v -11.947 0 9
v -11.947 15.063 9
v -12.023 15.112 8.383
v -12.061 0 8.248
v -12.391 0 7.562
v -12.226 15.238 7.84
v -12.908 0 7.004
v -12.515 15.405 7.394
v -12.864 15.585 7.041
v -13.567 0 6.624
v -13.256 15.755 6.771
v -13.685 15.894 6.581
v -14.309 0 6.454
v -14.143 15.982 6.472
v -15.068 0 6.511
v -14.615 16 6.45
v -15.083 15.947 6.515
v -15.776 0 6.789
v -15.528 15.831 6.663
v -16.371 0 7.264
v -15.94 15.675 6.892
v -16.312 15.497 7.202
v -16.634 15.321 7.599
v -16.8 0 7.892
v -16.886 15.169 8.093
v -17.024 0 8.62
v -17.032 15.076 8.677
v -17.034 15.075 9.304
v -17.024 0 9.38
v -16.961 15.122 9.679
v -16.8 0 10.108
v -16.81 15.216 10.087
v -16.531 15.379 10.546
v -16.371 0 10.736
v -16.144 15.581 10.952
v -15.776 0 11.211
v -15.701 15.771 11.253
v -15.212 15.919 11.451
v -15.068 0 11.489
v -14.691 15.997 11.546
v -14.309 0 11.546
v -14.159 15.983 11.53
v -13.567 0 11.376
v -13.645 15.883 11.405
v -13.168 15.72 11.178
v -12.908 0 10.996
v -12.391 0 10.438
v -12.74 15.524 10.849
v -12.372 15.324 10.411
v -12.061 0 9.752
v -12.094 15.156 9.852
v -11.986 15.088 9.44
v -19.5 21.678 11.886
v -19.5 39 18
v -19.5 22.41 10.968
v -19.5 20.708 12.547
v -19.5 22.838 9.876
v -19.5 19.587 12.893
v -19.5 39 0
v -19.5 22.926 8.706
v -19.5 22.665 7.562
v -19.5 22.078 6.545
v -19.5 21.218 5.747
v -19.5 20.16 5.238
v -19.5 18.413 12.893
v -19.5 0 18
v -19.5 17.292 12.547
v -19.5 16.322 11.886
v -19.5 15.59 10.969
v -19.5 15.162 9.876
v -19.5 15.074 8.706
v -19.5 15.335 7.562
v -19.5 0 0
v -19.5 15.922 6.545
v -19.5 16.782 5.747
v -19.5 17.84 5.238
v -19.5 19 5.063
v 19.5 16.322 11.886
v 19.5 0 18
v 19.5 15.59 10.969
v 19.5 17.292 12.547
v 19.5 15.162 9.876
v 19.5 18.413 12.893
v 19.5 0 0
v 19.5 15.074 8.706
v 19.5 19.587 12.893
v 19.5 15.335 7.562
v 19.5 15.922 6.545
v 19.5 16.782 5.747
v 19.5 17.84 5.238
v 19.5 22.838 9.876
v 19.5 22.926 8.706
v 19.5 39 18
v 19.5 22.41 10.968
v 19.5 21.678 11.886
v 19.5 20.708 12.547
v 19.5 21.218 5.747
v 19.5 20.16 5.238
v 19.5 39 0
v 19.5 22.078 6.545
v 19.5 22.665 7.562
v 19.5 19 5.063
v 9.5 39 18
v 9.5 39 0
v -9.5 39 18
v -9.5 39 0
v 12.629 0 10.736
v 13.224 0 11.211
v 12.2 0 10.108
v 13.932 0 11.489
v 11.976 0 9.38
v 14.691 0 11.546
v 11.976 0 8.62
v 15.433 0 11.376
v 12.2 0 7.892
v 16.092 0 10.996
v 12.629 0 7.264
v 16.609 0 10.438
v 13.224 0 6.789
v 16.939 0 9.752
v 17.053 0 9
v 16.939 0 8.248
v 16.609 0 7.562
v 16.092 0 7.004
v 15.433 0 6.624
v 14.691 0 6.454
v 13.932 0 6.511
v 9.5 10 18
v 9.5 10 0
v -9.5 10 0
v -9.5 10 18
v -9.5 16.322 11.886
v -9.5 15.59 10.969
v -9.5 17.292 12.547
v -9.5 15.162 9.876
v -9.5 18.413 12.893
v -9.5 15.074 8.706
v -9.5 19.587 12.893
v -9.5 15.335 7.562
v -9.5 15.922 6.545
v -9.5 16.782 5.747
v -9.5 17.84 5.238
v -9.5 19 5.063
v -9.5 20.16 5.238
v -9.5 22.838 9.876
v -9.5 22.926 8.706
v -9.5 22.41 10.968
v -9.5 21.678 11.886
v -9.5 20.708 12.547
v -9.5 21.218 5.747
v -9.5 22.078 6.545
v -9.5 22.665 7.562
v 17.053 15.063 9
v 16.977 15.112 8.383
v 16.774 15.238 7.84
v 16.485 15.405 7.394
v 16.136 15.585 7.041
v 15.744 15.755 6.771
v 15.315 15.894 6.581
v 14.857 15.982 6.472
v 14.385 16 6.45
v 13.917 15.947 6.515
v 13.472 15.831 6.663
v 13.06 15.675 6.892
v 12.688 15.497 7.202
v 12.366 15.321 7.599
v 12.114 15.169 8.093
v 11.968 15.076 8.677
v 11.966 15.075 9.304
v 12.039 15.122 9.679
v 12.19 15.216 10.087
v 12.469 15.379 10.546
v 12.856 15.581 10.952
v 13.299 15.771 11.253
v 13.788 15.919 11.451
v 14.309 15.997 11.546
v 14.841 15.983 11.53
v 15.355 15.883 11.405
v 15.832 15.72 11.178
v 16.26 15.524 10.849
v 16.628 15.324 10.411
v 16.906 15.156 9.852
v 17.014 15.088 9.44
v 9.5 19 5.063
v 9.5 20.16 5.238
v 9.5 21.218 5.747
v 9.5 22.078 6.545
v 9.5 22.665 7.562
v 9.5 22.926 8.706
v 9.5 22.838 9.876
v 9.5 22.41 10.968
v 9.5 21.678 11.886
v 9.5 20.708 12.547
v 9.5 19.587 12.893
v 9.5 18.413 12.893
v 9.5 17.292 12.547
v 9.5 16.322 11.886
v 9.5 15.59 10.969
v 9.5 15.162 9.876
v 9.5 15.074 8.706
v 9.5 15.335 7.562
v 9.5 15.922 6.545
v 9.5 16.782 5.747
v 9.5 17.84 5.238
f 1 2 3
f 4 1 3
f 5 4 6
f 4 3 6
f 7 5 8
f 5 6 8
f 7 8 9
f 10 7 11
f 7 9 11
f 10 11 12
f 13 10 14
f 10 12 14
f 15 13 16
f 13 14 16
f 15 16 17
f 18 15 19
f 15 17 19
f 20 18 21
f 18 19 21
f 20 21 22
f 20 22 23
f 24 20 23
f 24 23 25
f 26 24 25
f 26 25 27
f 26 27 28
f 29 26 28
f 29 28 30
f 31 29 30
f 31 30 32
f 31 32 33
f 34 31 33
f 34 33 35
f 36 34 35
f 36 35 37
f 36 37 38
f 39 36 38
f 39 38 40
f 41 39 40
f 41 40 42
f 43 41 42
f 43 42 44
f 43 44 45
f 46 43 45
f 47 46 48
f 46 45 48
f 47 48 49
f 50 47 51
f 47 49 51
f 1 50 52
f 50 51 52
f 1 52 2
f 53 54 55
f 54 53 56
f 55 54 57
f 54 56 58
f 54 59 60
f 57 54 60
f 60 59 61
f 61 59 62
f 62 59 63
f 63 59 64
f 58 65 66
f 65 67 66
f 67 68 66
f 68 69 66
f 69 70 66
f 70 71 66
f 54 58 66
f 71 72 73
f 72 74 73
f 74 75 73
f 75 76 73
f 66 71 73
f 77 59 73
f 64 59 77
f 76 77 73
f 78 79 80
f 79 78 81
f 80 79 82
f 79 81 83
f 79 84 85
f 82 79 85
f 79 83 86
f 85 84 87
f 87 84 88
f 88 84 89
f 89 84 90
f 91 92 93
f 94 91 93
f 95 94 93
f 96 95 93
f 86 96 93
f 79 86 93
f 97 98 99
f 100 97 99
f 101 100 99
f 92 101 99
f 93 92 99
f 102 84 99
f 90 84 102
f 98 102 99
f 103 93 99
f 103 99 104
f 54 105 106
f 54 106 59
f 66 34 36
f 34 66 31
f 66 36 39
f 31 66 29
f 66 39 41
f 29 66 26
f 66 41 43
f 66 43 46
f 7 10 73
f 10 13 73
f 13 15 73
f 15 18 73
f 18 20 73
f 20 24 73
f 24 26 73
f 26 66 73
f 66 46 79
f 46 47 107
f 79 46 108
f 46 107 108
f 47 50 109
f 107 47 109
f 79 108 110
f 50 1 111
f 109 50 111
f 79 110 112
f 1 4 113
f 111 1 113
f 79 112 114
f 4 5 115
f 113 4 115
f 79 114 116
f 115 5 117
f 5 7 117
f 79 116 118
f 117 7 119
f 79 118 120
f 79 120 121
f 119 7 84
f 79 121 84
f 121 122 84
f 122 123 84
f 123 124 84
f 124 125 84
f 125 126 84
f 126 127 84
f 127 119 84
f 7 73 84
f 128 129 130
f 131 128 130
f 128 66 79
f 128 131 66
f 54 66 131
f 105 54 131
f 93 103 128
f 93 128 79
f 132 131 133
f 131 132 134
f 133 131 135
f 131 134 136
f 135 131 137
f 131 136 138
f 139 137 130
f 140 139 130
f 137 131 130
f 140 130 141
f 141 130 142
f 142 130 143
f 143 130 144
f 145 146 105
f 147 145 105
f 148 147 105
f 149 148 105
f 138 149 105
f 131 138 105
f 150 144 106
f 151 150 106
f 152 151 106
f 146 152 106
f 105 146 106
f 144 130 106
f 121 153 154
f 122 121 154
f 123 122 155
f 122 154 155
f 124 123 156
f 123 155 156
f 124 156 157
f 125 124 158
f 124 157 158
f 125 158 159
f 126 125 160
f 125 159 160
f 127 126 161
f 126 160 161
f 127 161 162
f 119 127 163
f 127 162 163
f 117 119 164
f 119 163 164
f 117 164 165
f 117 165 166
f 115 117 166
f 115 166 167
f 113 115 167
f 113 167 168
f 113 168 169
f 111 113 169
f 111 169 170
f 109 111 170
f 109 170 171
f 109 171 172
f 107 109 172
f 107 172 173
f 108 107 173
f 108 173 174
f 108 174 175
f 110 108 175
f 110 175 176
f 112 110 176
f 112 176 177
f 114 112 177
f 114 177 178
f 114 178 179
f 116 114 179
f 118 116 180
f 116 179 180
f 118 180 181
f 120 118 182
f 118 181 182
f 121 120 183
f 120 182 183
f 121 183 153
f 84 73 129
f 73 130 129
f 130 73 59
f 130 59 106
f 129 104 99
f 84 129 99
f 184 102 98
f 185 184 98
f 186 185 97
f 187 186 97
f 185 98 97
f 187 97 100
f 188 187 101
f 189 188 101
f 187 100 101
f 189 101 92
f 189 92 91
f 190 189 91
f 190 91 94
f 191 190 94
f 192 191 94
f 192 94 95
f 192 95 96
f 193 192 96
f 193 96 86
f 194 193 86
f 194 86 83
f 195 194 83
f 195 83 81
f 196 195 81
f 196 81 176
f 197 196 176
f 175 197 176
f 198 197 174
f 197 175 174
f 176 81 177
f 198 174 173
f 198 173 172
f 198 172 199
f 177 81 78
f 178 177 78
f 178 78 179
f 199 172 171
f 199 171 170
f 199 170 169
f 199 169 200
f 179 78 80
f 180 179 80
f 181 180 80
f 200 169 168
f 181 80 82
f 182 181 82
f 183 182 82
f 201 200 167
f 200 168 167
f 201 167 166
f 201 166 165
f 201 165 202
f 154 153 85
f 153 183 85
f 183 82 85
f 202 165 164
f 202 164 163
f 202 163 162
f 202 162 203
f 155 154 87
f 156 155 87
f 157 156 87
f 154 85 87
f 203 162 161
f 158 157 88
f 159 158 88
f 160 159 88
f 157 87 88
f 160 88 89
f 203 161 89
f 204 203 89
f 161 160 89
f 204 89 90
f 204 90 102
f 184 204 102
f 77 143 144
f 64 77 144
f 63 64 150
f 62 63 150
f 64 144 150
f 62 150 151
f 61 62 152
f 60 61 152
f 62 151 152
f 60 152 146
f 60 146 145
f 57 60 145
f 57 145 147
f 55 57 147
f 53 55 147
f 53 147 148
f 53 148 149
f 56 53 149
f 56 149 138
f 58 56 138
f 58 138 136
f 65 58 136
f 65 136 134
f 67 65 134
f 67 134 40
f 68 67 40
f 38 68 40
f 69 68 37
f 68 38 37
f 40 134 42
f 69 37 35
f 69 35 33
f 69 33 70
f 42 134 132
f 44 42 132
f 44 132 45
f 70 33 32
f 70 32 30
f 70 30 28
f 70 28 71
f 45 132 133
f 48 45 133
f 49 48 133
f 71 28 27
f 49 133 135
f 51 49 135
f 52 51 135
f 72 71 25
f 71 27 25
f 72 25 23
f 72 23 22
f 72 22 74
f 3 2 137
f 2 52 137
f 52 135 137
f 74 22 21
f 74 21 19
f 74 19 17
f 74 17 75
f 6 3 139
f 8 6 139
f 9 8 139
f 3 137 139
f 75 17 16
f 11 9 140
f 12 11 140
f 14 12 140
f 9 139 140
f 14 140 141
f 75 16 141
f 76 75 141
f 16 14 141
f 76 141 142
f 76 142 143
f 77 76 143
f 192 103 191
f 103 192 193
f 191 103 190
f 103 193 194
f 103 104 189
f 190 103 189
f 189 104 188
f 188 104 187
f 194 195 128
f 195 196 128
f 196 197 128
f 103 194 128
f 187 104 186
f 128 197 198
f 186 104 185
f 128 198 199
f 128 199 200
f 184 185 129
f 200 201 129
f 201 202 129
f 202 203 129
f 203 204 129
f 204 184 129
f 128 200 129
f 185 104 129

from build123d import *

# Parameters (mm, degrees)
BOSS_EXTRUDE1_DEPTH         = 18
SKETCH3_R                   = 3.937
CUT_EXTRUDE1_DEPTH          = 40
F_1_4_20_TAPPED_HOLE1_D     = 5.1054
F_1_4_20_TAPPED_HOLE1_DEPTH = 19.05
F_1_4_20_TAPPED_HOLE1_TIP   = 1.533816902


with BuildPart() as part:
    # Sketch1 → Boss-Extrude1 (new body)
    with BuildSketch(Plane.XY):
        Polygon((-19.5, 0), (19.5, 0), (19.5, 39), (9.5, 39), (9.5, 10), (-9.5, 10), (-9.5, 39), (-19.5, 39), align=None)
    extrude(amount=BOSS_EXTRUDE1_DEPTH)

    # Sketch3 → Cut-Extrude1 (cut, through all)
    with BuildSketch(Plane(origin=(19.5, 0, 0), x_dir=(0, 0, -1), z_dir=(1, 0, 0))):
        with Locations((-9, 19)):
            Circle(SKETCH3_R)
    extrude(amount=-CUT_EXTRUDE1_DEPTH, mode=Mode.SUBTRACT)

    # 1/4-20 Tapped Hole1
    with Locations(Plane(origin=(0, 0, 0), x_dir=(-1, 0, 0), z_dir=(0, -1, 0))):
        with Locations((-14.5, -9), (14.5, -9)):
            Hole(F_1_4_20_TAPPED_HOLE1_D / 2, depth=F_1_4_20_TAPPED_HOLE1_DEPTH)
            with Locations((0, 0, -(F_1_4_20_TAPPED_HOLE1_DEPTH + F_1_4_20_TAPPED_HOLE1_TIP / 2))):  # 118° drill point
                Cone(0, F_1_4_20_TAPPED_HOLE1_D / 2, F_1_4_20_TAPPED_HOLE1_TIP, mode=Mode.SUBTRACT)


solid = part.part
